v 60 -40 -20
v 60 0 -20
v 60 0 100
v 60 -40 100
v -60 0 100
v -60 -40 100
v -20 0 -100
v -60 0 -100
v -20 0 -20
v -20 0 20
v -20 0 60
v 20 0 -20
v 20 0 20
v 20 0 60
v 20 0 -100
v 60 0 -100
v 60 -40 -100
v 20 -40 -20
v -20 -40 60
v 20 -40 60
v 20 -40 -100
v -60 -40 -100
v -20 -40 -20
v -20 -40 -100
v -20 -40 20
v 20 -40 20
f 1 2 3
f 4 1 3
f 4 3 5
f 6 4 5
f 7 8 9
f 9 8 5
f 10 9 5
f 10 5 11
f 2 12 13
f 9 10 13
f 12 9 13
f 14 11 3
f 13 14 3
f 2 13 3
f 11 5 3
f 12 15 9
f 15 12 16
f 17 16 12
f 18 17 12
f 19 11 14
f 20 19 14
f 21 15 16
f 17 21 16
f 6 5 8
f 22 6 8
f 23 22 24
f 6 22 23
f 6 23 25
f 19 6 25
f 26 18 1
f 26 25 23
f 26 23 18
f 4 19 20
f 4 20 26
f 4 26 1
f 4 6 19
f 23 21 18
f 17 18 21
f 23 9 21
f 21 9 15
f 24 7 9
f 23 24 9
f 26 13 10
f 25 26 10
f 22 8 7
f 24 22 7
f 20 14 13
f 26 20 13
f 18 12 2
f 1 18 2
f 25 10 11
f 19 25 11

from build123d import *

# Parameters (mm, degrees)
F0_W     = 40
F0_H     = 40
F1_DEPTH = 40


with BuildPart() as f1:
    # F0 (on Front) → F1 (new body)
    with BuildSketch(Plane.XZ):
        with Locations((-40, 80)):
            Rectangle(F0_W, F0_H)
        with Locations((0, 80)):
            Rectangle(F0_W, F0_H)
        with Locations((40, 80)):
            Rectangle(F0_W, F0_H)
        with Locations((40, 40)):
            Rectangle(F0_W, F0_H)
        with Locations((40, 0)):
            Rectangle(F0_W, F0_H)
        Rectangle(F0_W, F0_H)
        with Locations((-40, 0)):
            Rectangle(F0_W, F0_H)
        with Locations((-40, -40)):
            Rectangle(F0_W, F0_H)
        with Locations((-40, -80)):
            Rectangle(F0_W, F0_H)
        with Locations((-40, 40)):
            Rectangle(F0_W, F0_H)
        Polygon((20, -60), (20, -20), (-20, -20), (0, -60), align=None)
        Polygon((40, -60), (20, -60), (20, -100), (60, -100), align=None)
        Polygon((20, -100), (20, -60), (0, -60), align=None)
        Polygon((40, -60), (20, -20), (20, -60), align=None)
    extrude(amount=F1_DEPTH)


solid = f1.part
